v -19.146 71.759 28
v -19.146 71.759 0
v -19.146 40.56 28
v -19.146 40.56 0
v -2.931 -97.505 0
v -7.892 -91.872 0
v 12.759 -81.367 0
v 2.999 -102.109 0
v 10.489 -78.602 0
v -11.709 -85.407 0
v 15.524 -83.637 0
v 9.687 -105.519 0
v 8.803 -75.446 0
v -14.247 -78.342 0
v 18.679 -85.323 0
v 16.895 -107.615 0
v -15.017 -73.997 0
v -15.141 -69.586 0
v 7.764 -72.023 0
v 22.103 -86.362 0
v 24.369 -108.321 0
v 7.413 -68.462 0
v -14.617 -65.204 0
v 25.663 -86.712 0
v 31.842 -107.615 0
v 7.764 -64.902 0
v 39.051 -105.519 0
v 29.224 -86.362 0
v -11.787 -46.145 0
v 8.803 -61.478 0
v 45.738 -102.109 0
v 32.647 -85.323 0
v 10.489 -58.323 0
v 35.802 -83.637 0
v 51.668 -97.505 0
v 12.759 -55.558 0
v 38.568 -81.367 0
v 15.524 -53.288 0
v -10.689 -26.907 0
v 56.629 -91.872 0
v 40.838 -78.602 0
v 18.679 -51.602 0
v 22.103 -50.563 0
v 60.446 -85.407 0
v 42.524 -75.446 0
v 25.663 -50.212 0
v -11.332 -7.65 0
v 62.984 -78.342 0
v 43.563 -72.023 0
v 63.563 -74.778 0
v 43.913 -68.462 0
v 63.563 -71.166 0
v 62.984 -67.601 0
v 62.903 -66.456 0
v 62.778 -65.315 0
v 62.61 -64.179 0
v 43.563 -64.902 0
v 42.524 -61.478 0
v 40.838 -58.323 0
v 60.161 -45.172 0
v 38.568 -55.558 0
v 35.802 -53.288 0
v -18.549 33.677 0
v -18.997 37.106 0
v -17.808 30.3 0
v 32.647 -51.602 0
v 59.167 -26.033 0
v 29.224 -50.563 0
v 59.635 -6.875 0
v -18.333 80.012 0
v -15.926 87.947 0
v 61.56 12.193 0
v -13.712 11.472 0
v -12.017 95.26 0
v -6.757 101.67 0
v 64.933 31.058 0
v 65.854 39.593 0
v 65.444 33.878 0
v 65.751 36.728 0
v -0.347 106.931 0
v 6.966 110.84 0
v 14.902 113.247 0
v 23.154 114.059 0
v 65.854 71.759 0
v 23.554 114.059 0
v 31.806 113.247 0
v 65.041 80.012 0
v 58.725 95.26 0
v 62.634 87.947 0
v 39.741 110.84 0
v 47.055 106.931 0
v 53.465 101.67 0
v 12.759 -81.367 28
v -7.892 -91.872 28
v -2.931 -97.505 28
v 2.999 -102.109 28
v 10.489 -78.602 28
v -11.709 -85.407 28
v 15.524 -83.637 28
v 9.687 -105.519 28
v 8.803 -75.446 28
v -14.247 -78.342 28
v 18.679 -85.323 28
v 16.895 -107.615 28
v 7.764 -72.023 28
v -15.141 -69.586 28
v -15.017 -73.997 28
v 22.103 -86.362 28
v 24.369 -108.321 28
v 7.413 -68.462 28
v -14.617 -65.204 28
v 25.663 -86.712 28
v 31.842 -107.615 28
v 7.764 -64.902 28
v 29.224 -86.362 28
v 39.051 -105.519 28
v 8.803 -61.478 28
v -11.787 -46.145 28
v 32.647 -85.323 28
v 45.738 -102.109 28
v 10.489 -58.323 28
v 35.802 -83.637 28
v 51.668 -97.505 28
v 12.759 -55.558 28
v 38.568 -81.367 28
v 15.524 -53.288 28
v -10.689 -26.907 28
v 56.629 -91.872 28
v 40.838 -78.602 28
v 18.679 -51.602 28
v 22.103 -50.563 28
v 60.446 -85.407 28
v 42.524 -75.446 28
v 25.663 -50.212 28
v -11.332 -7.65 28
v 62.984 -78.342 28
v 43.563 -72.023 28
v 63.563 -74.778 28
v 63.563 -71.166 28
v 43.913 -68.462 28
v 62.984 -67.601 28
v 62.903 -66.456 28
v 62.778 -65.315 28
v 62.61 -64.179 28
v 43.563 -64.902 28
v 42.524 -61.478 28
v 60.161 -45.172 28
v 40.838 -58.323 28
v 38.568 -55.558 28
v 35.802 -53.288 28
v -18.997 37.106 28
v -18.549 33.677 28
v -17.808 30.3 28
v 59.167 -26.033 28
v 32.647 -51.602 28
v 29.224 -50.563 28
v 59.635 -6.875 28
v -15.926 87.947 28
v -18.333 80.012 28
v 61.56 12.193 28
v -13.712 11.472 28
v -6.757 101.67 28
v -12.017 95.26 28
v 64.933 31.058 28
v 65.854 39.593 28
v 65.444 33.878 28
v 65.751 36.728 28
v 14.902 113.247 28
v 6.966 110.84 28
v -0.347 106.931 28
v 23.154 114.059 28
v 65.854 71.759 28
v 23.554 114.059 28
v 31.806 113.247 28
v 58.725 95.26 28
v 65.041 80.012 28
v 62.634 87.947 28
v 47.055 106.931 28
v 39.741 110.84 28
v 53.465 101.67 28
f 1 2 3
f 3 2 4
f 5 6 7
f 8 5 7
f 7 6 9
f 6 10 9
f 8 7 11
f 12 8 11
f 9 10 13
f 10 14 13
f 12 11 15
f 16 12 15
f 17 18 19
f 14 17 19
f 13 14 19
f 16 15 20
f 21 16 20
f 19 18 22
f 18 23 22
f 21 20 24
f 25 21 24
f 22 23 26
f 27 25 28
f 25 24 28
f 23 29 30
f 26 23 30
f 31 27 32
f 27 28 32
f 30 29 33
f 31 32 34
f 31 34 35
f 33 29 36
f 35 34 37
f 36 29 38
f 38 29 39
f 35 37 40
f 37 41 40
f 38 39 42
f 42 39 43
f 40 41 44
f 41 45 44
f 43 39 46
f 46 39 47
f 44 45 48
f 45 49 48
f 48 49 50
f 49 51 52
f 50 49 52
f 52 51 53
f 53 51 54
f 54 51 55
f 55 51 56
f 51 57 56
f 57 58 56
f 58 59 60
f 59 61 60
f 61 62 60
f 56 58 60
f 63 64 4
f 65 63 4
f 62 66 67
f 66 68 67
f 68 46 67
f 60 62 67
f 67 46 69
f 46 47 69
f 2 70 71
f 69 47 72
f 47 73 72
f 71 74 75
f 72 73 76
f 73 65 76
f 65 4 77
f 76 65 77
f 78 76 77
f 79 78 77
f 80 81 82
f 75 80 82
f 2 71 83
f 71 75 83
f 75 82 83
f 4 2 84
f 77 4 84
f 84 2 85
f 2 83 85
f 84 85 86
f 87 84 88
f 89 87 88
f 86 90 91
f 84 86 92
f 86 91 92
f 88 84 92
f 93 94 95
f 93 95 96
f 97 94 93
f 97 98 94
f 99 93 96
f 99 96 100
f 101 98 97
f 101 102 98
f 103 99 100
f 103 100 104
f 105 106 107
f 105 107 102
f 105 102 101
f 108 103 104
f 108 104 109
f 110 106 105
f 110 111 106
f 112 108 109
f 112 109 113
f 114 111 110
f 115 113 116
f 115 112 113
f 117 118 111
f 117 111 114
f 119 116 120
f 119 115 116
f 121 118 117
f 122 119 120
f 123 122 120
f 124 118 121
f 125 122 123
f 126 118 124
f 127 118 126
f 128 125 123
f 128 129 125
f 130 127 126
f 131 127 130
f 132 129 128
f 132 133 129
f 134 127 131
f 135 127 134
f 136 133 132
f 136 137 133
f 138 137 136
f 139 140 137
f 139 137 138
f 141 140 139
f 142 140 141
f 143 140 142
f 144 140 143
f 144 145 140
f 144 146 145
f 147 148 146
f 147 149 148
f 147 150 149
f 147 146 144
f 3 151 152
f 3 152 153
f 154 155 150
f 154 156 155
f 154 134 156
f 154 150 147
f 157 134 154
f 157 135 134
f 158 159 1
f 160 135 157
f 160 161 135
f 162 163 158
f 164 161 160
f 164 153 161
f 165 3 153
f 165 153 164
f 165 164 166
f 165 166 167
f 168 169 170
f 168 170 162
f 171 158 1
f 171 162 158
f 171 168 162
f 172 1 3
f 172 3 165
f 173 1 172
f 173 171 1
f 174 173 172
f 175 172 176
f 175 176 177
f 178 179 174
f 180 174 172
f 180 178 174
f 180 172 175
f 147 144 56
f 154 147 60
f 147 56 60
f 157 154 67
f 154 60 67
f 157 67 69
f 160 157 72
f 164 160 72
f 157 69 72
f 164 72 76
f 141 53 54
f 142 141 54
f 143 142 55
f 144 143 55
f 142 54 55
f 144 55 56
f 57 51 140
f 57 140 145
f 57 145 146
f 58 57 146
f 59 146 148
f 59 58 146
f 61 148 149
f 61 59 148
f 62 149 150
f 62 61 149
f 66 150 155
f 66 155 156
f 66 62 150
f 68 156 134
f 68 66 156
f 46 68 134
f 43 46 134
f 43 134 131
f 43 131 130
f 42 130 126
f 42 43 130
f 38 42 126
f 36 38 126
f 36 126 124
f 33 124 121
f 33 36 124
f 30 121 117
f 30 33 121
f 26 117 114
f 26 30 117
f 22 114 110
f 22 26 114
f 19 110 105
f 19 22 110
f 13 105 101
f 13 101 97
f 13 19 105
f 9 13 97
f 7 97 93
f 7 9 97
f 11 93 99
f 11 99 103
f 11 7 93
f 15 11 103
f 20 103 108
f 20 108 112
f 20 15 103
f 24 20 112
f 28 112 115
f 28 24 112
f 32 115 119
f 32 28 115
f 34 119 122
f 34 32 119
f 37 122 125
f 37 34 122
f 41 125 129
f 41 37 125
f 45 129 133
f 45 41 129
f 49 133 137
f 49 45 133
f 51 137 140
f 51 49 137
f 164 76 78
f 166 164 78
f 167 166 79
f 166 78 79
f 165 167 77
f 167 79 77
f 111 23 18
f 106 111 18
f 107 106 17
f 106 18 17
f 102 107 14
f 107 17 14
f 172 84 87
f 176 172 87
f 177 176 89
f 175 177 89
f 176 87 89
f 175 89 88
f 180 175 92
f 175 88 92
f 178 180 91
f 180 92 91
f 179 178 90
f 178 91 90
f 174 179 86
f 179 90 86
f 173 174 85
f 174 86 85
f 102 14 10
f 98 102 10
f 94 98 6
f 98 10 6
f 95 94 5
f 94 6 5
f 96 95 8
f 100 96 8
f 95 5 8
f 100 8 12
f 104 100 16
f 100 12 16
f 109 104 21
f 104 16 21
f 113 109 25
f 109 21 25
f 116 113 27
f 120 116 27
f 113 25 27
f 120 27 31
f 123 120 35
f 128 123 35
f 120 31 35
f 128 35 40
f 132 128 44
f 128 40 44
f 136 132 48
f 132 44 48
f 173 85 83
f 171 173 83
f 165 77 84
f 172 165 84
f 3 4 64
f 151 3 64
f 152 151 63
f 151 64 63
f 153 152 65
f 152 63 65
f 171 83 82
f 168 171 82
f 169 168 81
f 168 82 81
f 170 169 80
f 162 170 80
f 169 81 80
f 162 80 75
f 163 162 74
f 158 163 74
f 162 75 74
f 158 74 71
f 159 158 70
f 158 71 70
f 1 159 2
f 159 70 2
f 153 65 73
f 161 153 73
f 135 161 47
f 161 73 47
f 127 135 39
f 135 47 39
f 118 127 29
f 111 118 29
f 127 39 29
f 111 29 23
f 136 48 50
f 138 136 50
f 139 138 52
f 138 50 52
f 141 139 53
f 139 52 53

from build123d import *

# Parameters (mm, degrees)
F0_R     = 18.25
F1_DEPTH = 28


# Not quite as in the source:
# - a feature names something its author has since deleted; it is built from what else it names


with BuildPart() as f1:
    # F0 (on Top) → F1 (new body)
    with BuildSketch(Plane.XY):
        with BuildLine():
            Line((23.5539685776, 114.0594776705), (23.1539685776, 114.0594776705))
            ThreePointArc((23.1539685776, 114.0594776705), (-6.7566482666, 101.6700945147), (-19.1460314224, 71.7594776705))
            Line((-19.1460314224, 71.7594776705), (-19.1460314224, 40.5602956202))
            ThreePointArc((-19.1460314224, 40.5602956202), (-18.8100234812, 35.3865412816), (-17.8076447246, 30.2997080702))
            ThreePointArc((-17.8076447246, 30.2997080702), (-10.7929031817, -17.2712382489), (-14.6173474127, -65.2042660996))
            ThreePointArc((-14.6173474127, -65.2042660996), (-15.16027858, -71.7938854137), (-14.2465279536, -78.3423903385))
            ThreePointArc((-14.2465279536, -78.3423903385), (24.3685631197, -108.3214348669), (62.983654193, -78.3423903385))
            ThreePointArc((62.983654193, -78.3423903385), (63.6357145351, -72.9718093248), (62.983654193, -67.6012283111))
            ThreePointArc((62.983654193, -67.6012283111), (62.8457925436, -65.8846278256), (62.6096584736, -64.1787662362))
            ThreePointArc((62.6096584736, -64.1787662362), (59.2183076196, -16.4494096847), (64.932743293, 31.0578314726))
            ThreePointArc((64.932743293, 31.0578314726), (65.6229953988, 35.3006378942), (65.8539685776, 39.593015521))
            Line((65.8539685776, 39.593015521), (65.8539685776, 71.7594776705))
            ThreePointArc((65.8539685776, 71.7594776705), (53.4645854218, 101.6700945147), (23.5539685776, 114.0594776705))
        make_face()
        with Locations((25.6633214675, -68.4624532511)):
            Circle(F0_R, mode=Mode.SUBTRACT)
    extrude(amount=F1_DEPTH)


solid = f1.part
